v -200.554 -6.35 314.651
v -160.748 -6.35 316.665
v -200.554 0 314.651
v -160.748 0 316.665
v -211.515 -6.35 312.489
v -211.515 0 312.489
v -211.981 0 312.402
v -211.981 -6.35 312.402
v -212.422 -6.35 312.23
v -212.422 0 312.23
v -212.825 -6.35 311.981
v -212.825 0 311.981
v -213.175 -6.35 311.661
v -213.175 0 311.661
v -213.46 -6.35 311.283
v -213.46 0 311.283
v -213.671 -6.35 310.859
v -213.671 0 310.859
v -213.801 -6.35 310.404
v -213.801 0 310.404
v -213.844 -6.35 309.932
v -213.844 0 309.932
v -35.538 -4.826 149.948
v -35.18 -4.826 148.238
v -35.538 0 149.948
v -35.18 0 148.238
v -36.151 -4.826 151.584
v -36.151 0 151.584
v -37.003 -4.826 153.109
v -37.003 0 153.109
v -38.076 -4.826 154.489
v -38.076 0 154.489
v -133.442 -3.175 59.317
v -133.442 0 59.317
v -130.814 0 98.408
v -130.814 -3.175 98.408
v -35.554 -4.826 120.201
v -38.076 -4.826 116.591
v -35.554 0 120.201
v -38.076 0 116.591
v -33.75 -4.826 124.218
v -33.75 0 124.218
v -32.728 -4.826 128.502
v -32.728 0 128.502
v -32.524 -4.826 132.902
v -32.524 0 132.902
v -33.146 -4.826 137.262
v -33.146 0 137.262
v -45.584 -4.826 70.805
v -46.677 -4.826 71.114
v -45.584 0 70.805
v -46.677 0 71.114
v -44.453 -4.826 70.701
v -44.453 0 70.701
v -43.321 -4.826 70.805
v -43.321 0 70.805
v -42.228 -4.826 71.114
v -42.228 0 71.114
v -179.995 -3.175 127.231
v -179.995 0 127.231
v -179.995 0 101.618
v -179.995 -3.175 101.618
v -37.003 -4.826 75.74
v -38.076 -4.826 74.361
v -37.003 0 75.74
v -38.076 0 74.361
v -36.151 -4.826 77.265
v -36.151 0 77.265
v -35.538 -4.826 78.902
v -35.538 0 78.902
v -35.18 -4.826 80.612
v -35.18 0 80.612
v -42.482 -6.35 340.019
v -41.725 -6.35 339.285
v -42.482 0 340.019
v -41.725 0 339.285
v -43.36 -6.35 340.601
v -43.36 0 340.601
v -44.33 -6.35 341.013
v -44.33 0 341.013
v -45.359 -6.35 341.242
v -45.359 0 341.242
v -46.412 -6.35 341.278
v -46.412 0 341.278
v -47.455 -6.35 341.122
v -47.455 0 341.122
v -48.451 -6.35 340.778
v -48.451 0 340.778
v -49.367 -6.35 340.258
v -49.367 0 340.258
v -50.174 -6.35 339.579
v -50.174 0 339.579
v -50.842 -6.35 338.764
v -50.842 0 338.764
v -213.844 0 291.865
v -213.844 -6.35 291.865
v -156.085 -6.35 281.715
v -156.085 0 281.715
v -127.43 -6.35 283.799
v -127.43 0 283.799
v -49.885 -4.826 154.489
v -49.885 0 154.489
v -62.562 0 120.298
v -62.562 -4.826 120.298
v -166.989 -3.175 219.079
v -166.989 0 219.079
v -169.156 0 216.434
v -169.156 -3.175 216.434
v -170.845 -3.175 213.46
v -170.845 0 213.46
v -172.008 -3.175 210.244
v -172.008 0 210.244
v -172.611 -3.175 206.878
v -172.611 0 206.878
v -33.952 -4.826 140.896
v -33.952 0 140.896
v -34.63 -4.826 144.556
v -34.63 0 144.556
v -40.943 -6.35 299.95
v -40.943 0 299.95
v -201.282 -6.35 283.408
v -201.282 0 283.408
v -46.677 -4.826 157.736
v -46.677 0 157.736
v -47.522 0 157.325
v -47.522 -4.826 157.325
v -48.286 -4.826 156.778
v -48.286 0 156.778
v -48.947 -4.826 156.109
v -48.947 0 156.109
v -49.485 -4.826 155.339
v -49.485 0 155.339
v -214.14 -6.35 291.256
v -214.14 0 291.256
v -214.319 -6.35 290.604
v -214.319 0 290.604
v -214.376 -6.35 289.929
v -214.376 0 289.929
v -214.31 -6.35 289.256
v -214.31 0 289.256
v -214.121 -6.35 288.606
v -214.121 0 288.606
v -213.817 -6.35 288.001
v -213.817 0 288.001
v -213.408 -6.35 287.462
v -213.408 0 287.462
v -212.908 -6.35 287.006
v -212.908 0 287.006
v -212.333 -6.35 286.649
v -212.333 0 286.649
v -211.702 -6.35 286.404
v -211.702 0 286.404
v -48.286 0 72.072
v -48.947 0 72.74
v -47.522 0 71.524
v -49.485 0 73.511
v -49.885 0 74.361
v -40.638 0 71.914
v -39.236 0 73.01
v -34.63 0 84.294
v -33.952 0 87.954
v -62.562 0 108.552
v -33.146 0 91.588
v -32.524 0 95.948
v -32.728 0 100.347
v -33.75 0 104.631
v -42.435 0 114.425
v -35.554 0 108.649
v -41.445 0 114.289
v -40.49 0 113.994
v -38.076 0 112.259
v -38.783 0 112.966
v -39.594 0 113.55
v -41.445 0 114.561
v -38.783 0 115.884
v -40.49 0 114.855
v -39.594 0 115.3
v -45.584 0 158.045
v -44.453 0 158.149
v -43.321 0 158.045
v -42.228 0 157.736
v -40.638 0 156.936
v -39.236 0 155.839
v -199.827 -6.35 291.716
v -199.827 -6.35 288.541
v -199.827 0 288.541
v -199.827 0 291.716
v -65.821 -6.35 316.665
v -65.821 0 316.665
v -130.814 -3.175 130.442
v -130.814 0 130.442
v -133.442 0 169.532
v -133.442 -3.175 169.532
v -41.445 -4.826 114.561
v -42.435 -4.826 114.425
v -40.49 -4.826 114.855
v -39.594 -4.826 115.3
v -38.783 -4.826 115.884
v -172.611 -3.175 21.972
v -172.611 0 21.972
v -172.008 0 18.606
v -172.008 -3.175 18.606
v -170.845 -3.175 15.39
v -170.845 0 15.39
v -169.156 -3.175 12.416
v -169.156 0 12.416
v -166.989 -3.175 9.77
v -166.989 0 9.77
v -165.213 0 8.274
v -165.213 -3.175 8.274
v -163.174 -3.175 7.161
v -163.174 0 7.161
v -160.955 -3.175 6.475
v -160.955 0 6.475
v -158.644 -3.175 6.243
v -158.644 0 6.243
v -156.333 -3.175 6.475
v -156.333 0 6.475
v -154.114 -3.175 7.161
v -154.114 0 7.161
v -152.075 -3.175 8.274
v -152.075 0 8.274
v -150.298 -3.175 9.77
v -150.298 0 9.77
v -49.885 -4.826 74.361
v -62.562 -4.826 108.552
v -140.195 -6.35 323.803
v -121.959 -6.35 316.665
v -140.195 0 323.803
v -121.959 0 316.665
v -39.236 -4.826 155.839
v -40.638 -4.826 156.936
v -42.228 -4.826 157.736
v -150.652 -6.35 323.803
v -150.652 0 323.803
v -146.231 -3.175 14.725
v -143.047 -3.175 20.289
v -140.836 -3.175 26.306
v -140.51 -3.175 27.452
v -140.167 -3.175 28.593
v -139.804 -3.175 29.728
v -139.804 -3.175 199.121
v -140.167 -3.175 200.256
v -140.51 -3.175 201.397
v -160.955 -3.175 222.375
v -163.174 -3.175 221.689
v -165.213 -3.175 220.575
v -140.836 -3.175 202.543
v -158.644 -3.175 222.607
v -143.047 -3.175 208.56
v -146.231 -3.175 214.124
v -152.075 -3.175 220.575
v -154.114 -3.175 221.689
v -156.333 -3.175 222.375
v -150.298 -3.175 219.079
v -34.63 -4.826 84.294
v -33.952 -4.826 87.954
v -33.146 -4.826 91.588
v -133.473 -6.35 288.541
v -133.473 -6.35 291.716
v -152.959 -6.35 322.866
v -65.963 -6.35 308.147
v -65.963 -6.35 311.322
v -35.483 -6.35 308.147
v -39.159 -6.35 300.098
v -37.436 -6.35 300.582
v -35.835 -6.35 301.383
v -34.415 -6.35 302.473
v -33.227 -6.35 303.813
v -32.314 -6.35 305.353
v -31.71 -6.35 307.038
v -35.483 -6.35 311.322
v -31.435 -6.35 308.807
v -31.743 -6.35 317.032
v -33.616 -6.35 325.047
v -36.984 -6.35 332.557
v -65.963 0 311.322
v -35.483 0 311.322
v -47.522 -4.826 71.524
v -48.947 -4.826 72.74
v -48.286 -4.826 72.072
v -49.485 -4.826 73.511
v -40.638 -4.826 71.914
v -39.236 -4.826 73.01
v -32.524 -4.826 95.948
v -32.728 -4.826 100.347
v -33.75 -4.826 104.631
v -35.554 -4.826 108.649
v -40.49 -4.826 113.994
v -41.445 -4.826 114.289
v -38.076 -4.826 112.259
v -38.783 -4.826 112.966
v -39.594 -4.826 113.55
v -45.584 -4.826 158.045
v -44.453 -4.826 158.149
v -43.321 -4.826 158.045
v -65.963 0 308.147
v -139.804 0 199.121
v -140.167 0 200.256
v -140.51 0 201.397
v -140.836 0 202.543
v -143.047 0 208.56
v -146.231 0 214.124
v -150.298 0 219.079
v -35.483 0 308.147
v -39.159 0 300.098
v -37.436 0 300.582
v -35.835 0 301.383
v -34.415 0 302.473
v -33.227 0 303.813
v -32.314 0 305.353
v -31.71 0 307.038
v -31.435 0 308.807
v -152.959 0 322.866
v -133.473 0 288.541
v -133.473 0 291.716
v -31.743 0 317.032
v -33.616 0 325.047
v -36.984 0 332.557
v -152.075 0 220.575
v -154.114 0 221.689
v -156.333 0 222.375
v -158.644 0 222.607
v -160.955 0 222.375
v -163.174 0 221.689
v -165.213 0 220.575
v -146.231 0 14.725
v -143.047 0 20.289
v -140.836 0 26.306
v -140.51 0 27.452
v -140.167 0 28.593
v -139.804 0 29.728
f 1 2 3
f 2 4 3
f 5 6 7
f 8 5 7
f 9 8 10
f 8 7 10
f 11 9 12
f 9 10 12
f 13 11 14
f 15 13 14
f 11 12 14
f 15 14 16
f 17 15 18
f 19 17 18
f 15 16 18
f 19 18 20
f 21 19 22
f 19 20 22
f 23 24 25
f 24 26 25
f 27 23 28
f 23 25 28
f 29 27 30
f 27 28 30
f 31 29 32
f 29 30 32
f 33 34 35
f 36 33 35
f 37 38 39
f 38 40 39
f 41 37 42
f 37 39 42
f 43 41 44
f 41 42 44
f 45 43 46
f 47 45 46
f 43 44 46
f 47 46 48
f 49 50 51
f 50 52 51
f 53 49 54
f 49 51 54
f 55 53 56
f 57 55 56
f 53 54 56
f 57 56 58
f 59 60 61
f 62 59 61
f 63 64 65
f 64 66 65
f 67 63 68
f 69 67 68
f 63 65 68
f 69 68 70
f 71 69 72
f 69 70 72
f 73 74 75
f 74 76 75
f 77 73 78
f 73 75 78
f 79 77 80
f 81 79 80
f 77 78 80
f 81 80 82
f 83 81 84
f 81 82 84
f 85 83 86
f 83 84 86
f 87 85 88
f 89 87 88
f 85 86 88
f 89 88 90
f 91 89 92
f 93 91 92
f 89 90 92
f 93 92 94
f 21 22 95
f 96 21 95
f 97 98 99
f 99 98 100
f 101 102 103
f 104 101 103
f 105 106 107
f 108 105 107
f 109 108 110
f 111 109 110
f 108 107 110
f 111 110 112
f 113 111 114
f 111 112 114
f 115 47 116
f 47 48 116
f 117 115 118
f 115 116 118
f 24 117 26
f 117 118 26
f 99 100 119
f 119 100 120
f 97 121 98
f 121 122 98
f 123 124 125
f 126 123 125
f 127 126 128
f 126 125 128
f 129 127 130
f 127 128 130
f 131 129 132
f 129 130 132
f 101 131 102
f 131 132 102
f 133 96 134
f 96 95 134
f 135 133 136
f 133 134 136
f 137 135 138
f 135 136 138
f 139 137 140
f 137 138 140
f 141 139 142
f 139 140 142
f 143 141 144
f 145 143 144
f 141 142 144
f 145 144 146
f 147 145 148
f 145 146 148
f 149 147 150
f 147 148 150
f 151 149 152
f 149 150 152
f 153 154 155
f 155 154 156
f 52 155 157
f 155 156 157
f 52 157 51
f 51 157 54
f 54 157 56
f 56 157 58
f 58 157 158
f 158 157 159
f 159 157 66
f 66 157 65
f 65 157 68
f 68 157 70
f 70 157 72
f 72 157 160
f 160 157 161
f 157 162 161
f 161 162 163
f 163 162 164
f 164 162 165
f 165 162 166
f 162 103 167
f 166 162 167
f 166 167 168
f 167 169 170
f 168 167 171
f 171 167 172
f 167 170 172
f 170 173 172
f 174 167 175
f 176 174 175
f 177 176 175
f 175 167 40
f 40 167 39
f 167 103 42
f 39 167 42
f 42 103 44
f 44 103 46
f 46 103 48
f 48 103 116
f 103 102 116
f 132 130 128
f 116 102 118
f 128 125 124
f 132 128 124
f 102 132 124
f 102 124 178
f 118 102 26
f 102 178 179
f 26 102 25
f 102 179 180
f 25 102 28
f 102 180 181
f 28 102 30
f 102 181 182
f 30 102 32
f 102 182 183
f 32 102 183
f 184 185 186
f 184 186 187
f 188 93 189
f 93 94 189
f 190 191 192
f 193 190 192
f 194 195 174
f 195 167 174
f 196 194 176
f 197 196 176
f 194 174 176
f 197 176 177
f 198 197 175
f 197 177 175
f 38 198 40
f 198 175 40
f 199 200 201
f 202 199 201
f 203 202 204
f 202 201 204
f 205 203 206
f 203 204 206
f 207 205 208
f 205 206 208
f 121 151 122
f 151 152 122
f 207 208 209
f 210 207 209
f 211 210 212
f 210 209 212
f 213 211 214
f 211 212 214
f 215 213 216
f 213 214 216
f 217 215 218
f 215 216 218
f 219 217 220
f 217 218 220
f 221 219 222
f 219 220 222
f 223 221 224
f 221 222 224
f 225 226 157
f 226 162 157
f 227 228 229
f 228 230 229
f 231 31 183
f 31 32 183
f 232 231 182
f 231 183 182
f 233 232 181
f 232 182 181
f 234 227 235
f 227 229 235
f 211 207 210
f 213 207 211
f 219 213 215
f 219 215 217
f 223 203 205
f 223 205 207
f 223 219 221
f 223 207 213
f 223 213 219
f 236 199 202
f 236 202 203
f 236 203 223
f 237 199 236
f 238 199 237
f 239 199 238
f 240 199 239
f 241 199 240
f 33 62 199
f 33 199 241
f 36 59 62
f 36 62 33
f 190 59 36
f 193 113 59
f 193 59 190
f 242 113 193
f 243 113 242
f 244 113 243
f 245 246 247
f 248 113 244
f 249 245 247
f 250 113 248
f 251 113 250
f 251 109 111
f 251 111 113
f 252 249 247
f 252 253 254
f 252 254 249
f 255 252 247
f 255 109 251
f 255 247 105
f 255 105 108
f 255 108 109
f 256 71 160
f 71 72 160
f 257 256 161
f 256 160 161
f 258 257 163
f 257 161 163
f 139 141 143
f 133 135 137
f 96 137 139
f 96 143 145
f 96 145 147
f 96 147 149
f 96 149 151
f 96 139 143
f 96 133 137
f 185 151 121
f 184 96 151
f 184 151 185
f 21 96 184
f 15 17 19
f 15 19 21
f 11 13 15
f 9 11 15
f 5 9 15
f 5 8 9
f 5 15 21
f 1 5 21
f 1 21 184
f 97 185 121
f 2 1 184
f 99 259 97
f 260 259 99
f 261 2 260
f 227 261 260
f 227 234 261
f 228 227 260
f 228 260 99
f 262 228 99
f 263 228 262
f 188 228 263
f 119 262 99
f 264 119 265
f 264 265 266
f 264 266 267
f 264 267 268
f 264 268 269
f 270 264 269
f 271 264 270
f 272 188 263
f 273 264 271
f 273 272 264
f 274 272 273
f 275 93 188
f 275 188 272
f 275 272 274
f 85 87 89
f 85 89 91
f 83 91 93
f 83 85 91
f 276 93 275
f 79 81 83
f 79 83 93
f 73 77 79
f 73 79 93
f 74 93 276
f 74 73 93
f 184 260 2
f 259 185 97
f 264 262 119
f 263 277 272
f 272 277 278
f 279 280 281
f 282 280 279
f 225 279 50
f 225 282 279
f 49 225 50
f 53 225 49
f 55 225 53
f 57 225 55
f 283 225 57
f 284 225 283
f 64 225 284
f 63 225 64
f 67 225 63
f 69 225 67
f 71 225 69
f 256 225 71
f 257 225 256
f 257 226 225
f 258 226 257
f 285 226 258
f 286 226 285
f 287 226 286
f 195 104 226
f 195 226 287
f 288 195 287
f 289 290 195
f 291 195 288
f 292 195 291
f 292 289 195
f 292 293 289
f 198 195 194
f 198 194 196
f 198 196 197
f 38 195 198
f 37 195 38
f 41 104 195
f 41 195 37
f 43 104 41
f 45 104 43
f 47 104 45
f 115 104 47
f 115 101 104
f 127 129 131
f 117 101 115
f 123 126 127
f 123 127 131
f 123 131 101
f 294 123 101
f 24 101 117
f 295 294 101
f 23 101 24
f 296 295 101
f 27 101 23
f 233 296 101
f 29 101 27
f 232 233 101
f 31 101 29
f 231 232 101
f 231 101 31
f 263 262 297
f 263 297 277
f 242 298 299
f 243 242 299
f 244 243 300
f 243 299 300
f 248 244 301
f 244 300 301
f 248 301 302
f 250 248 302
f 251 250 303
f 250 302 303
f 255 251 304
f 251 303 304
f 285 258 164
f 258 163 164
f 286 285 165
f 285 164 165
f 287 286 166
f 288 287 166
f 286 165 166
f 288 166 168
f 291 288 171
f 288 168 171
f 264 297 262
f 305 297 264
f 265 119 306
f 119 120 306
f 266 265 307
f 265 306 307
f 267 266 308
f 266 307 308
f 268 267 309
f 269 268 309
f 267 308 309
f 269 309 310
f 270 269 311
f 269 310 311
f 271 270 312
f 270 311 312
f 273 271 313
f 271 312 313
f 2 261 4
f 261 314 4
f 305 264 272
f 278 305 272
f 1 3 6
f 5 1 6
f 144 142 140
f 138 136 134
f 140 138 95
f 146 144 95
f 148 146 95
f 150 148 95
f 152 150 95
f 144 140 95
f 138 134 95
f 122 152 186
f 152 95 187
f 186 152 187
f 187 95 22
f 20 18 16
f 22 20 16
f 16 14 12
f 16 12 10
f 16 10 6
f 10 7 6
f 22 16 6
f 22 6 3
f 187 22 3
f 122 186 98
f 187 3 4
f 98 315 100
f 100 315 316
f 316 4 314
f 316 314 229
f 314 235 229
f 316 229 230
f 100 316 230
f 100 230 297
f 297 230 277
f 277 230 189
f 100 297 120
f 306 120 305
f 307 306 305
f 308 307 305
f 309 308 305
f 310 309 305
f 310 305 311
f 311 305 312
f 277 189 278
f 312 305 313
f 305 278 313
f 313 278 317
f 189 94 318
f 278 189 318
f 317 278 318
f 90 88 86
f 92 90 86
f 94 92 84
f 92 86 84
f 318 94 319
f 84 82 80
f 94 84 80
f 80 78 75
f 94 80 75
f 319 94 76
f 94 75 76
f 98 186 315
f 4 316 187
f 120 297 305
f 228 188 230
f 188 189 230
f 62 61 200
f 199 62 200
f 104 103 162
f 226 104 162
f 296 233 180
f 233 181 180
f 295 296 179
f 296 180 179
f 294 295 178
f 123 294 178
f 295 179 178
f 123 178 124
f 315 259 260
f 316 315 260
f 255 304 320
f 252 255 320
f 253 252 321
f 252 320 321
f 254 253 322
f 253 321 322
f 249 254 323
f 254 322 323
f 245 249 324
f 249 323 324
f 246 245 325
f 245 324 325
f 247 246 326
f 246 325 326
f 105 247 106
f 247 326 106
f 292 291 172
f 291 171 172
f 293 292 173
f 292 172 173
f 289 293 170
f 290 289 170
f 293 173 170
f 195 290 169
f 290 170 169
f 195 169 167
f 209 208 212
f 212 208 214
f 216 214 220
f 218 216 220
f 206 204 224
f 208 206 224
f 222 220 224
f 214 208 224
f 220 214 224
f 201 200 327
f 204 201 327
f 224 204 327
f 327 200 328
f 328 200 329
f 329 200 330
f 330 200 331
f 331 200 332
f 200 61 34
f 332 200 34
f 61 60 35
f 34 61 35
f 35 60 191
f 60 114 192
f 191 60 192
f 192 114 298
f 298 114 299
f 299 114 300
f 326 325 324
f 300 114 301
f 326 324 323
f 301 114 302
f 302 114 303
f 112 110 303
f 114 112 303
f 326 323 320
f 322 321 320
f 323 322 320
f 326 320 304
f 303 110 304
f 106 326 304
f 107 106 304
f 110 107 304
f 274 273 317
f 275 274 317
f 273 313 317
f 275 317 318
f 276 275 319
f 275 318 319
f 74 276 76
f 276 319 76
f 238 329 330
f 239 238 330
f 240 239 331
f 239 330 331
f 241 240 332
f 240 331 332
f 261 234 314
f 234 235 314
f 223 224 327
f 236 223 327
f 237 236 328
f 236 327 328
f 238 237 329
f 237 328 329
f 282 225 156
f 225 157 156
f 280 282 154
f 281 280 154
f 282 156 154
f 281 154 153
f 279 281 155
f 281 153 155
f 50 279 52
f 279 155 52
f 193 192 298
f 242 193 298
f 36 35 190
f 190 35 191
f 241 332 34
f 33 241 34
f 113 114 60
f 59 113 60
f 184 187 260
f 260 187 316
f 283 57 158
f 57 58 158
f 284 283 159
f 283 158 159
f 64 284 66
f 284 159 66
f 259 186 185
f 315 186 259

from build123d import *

# Parameters (mm, degrees)
F2_DEPTH = 3.175
F3_DEPTH = 3.175
F4_W     = 66.3537942724
F4_H     = 3.175
F4_W_2   = 30.48
F5_DEPTH = 6.351
F6_DEPTH = 1.651


# Not quite as in the source:
# - a length typed as a fraction of an inch, garbled in the dataset ("3 / 203.2 mm" for 3/8 in), is restored


with BuildPart() as f2:
    # F1 (on Front) → F2 (new body)
    with BuildSketch(Plane.XZ):
        with BuildLine():
            Line((-172.6110667898, 206.8775344049), (-179.9945831299, 127.231195569))
            Line((-179.9945831299, 127.231195569), (-179.9945831299, 114.4247949123))
            Line((-179.9945831299, 114.4247949123), (-179.9945831299, 101.6183942556))
            Line((-179.9945831299, 101.6183942556), (-172.6110667898, 21.9720554197))
            ThreePointArc((-172.6110667898, 21.9720554197), (-170.845271575, 15.3895933308), (-166.9893544961, 9.7700966119))
            ThreePointArc((-166.9893544961, 9.7700966119), (-158.643886447, 6.2428365844), (-150.2984183978, 9.7700966119))
            ThreePointArc((-150.2984183978, 9.7700966119), (-144.5228447898, 17.4405844589), (-140.8358120402, 26.3062160673))
            ThreePointArc((-140.8358120402, 26.3062160673), (-140.3408665737, 28.0234348127), (-139.8043911336, 29.7281357651))
            Line((-139.8043911336, 29.7281357651), (-133.4421634674, 59.3172758818))
            Line((-133.4421634674, 59.3172758818), (-130.8142542839, 98.4076410532))
            Line((-130.8142542839, 98.4076410532), (-130.8142542839, 114.4247949123))
            Line((-130.8142542839, 114.4247949123), (-130.8142542839, 130.4419487715))
            Line((-130.8142542839, 130.4419487715), (-133.4421634674, 169.5323139429))
            Line((-133.4421634674, 169.5323139429), (-139.8043911336, 199.1214540596))
            ThreePointArc((-139.8043911336, 199.1214540596), (-140.3408665737, 200.8261550119), (-140.8358120402, 202.5433737574))
            ThreePointArc((-140.8358120402, 202.5433737574), (-144.5228447898, 211.4090053658), (-150.2984183978, 219.0794932127))
            ThreePointArc((-150.2984183978, 219.0794932127), (-158.643886447, 222.6067532402), (-166.9893544961, 219.0794932127))
            ThreePointArc((-166.9893544961, 219.0794932127), (-170.845271575, 213.4599964938), (-172.6110667898, 206.8775344049))
        make_face()
    extrude(amount=F2_DEPTH)


with BuildPart() as f2b:
    # F1 (on Front) → F2, piece 2 (new body)
    with BuildSketch(Plane.XZ):
        with BuildLine():
            Line((-213.8443440199, 309.9319636822), (-213.8443440199, 291.8651401997))
            ThreePointArc((-213.8443440199, 291.8651401997), (-214.1212611685, 288.6056865576), (-211.7022424936, 286.4036262035))
            Line((-211.7022424936, 286.4036262035), (-201.2821733952, 283.4078669548))
            Line((-201.2821733952, 283.4078669548), (-156.0851335526, 281.714618206))
            Line((-156.0851335526, 281.714618206), (-127.429947257, 283.798635006))
            Line((-127.429947257, 283.798635006), (-40.9433990717, 299.9497354031))
            ThreePointArc((-40.9433990717, 299.9497354031), (-34.41478075, 302.4733352076), (-31.4350910485, 308.8068068027))
            ThreePointArc((-31.4350910485, 308.8068068027), (-33.6156920244, 325.0469200325), (-41.7249053717, 339.285492897))
            ThreePointArc((-41.7249053717, 339.285492897), (-46.4124339616, 341.278099702), (-50.8424639702, 338.7644886971))
            Line((-50.8424639702, 338.7644886971), (-65.8213049173, 316.6650235653))
            Line((-65.8213049173, 316.6650235653), (-121.9594106078, 316.6650235653))
            Line((-121.9594106078, 316.6650235653), (-140.1952803135, 323.8029181957))
            Line((-140.1952803135, 323.8029181957), (-150.6517082453, 323.8029181957))
            Line((-150.6517082453, 323.8029181957), (-152.9593467712, 322.8657543659))
            Line((-152.9593467712, 322.8657543659), (-160.7475876808, 316.6650235653))
            Line((-160.7475876808, 316.6650235653), (-200.554177165, 314.651042223))
            Line((-200.554177165, 314.651042223), (-211.5154117346, 312.4890625477))
            ThreePointArc((-211.5154117346, 312.4890625477), (-213.174849499, 311.6613190677), (-213.8443440199, 309.9319636822))
        make_face()
    extrude(amount=F2_DEPTH)

    # F3 (add): a face of the model
    f3_faces = [f2b.faces().sort_by_distance(p)[0] for p in [
        (-124.5842443217, -3.175, 304.2983822932),
    ]]
    extrude(f3_faces, amount=F3_DEPTH)

    # F4 (on Front) → F5 (cut, through all)
    with BuildSketch(Plane.XZ):
        with Locations((-166.6496883212, 290.1289781431)):
            Rectangle(F4_W, F4_H)
        with Locations((-50.7230447626, 309.7342949867)):
            Rectangle(F4_W_2, F4_H)
    extrude(amount=F5_DEPTH, mode=Mode.SUBTRACT)


with BuildPart() as f2c:
    # F1 (on Front) → F2, piece 3 (new body)
    with BuildSketch(Plane.XZ):
        with BuildLine():
            Line((-62.5618458308, 120.2978070905), (-62.5618458308, 114.4247949123))
            Line((-62.5618458308, 114.4247949123), (-62.5618458308, 108.5517827342))
            Line((-62.5618458308, 108.5517827342), (-49.8851687327, 74.3610709906))
            ThreePointArc((-49.8851687327, 74.3610709906), (-48.6307450368, 72.3918746751), (-46.6768778861, 71.1137056351))
            ThreePointArc((-46.6768778861, 71.1137056351), (-44.4525964558, 70.7007257405), (-42.2283150256, 71.1137056351))
            ThreePointArc((-42.2283150256, 71.1137056351), (-39.9097876721, 72.4272505107), (-38.0764007568, 74.3610709906))
            ThreePointArc((-38.0764007568, 74.3610709906), (-36.150795106, 77.2653168267), (-35.1798926376, 80.6119493724))
            ThreePointArc((-35.1798926376, 80.6119493724), (-34.3068965337, 86.1265511206), (-33.1462513848, 91.5878565943))
            ThreePointArc((-33.1462513848, 91.5878565943), (-33.1381821173, 102.5132721235), (-38.0764007568, 112.2589771398))
            ThreePointArc((-38.0764007568, 112.2589771398), (-40.0329250575, 113.7901835089), (-42.4349759833, 114.4247949123))
            ThreePointArc((-42.4349759833, 114.4247949123), (-40.0329250575, 115.0594063158), (-38.0764007568, 116.5906126849))
            ThreePointArc((-38.0764007568, 116.5906126849), (-33.1381821173, 126.3363177012), (-33.1462513848, 137.2617332304))
            ThreePointArc((-33.1462513848, 137.2617332304), (-34.3068965337, 142.7230387041), (-35.1798926376, 148.2376404523))
            ThreePointArc((-35.1798926376, 148.2376404523), (-36.150795106, 151.584272998), (-38.0764007568, 154.4885188341))
            ThreePointArc((-38.0764007568, 154.4885188341), (-39.9097876721, 156.4223393139), (-42.2283150256, 157.7358841896))
            ThreePointArc((-42.2283150256, 157.7358841896), (-44.4525964558, 158.1488640842), (-46.6768778861, 157.7358841896))
            ThreePointArc((-46.6768778861, 157.7358841896), (-48.6307450368, 156.4577151496), (-49.8851687327, 154.4885188341))
            Line((-49.8851687327, 154.4885188341), (-62.5618458308, 120.2978070905))
        make_face()
    extrude(amount=F2_DEPTH)

    # F6 (add): a face of the model
    f6_faces = [f2c.faces().sort_by_distance(p)[0] for p in [
        (-46.1187241122, -3.175, 114.4247949123),
    ]]
    extrude(f6_faces, amount=F6_DEPTH)


solid = Compound([f2.part, f2b.part, f2c.part])
